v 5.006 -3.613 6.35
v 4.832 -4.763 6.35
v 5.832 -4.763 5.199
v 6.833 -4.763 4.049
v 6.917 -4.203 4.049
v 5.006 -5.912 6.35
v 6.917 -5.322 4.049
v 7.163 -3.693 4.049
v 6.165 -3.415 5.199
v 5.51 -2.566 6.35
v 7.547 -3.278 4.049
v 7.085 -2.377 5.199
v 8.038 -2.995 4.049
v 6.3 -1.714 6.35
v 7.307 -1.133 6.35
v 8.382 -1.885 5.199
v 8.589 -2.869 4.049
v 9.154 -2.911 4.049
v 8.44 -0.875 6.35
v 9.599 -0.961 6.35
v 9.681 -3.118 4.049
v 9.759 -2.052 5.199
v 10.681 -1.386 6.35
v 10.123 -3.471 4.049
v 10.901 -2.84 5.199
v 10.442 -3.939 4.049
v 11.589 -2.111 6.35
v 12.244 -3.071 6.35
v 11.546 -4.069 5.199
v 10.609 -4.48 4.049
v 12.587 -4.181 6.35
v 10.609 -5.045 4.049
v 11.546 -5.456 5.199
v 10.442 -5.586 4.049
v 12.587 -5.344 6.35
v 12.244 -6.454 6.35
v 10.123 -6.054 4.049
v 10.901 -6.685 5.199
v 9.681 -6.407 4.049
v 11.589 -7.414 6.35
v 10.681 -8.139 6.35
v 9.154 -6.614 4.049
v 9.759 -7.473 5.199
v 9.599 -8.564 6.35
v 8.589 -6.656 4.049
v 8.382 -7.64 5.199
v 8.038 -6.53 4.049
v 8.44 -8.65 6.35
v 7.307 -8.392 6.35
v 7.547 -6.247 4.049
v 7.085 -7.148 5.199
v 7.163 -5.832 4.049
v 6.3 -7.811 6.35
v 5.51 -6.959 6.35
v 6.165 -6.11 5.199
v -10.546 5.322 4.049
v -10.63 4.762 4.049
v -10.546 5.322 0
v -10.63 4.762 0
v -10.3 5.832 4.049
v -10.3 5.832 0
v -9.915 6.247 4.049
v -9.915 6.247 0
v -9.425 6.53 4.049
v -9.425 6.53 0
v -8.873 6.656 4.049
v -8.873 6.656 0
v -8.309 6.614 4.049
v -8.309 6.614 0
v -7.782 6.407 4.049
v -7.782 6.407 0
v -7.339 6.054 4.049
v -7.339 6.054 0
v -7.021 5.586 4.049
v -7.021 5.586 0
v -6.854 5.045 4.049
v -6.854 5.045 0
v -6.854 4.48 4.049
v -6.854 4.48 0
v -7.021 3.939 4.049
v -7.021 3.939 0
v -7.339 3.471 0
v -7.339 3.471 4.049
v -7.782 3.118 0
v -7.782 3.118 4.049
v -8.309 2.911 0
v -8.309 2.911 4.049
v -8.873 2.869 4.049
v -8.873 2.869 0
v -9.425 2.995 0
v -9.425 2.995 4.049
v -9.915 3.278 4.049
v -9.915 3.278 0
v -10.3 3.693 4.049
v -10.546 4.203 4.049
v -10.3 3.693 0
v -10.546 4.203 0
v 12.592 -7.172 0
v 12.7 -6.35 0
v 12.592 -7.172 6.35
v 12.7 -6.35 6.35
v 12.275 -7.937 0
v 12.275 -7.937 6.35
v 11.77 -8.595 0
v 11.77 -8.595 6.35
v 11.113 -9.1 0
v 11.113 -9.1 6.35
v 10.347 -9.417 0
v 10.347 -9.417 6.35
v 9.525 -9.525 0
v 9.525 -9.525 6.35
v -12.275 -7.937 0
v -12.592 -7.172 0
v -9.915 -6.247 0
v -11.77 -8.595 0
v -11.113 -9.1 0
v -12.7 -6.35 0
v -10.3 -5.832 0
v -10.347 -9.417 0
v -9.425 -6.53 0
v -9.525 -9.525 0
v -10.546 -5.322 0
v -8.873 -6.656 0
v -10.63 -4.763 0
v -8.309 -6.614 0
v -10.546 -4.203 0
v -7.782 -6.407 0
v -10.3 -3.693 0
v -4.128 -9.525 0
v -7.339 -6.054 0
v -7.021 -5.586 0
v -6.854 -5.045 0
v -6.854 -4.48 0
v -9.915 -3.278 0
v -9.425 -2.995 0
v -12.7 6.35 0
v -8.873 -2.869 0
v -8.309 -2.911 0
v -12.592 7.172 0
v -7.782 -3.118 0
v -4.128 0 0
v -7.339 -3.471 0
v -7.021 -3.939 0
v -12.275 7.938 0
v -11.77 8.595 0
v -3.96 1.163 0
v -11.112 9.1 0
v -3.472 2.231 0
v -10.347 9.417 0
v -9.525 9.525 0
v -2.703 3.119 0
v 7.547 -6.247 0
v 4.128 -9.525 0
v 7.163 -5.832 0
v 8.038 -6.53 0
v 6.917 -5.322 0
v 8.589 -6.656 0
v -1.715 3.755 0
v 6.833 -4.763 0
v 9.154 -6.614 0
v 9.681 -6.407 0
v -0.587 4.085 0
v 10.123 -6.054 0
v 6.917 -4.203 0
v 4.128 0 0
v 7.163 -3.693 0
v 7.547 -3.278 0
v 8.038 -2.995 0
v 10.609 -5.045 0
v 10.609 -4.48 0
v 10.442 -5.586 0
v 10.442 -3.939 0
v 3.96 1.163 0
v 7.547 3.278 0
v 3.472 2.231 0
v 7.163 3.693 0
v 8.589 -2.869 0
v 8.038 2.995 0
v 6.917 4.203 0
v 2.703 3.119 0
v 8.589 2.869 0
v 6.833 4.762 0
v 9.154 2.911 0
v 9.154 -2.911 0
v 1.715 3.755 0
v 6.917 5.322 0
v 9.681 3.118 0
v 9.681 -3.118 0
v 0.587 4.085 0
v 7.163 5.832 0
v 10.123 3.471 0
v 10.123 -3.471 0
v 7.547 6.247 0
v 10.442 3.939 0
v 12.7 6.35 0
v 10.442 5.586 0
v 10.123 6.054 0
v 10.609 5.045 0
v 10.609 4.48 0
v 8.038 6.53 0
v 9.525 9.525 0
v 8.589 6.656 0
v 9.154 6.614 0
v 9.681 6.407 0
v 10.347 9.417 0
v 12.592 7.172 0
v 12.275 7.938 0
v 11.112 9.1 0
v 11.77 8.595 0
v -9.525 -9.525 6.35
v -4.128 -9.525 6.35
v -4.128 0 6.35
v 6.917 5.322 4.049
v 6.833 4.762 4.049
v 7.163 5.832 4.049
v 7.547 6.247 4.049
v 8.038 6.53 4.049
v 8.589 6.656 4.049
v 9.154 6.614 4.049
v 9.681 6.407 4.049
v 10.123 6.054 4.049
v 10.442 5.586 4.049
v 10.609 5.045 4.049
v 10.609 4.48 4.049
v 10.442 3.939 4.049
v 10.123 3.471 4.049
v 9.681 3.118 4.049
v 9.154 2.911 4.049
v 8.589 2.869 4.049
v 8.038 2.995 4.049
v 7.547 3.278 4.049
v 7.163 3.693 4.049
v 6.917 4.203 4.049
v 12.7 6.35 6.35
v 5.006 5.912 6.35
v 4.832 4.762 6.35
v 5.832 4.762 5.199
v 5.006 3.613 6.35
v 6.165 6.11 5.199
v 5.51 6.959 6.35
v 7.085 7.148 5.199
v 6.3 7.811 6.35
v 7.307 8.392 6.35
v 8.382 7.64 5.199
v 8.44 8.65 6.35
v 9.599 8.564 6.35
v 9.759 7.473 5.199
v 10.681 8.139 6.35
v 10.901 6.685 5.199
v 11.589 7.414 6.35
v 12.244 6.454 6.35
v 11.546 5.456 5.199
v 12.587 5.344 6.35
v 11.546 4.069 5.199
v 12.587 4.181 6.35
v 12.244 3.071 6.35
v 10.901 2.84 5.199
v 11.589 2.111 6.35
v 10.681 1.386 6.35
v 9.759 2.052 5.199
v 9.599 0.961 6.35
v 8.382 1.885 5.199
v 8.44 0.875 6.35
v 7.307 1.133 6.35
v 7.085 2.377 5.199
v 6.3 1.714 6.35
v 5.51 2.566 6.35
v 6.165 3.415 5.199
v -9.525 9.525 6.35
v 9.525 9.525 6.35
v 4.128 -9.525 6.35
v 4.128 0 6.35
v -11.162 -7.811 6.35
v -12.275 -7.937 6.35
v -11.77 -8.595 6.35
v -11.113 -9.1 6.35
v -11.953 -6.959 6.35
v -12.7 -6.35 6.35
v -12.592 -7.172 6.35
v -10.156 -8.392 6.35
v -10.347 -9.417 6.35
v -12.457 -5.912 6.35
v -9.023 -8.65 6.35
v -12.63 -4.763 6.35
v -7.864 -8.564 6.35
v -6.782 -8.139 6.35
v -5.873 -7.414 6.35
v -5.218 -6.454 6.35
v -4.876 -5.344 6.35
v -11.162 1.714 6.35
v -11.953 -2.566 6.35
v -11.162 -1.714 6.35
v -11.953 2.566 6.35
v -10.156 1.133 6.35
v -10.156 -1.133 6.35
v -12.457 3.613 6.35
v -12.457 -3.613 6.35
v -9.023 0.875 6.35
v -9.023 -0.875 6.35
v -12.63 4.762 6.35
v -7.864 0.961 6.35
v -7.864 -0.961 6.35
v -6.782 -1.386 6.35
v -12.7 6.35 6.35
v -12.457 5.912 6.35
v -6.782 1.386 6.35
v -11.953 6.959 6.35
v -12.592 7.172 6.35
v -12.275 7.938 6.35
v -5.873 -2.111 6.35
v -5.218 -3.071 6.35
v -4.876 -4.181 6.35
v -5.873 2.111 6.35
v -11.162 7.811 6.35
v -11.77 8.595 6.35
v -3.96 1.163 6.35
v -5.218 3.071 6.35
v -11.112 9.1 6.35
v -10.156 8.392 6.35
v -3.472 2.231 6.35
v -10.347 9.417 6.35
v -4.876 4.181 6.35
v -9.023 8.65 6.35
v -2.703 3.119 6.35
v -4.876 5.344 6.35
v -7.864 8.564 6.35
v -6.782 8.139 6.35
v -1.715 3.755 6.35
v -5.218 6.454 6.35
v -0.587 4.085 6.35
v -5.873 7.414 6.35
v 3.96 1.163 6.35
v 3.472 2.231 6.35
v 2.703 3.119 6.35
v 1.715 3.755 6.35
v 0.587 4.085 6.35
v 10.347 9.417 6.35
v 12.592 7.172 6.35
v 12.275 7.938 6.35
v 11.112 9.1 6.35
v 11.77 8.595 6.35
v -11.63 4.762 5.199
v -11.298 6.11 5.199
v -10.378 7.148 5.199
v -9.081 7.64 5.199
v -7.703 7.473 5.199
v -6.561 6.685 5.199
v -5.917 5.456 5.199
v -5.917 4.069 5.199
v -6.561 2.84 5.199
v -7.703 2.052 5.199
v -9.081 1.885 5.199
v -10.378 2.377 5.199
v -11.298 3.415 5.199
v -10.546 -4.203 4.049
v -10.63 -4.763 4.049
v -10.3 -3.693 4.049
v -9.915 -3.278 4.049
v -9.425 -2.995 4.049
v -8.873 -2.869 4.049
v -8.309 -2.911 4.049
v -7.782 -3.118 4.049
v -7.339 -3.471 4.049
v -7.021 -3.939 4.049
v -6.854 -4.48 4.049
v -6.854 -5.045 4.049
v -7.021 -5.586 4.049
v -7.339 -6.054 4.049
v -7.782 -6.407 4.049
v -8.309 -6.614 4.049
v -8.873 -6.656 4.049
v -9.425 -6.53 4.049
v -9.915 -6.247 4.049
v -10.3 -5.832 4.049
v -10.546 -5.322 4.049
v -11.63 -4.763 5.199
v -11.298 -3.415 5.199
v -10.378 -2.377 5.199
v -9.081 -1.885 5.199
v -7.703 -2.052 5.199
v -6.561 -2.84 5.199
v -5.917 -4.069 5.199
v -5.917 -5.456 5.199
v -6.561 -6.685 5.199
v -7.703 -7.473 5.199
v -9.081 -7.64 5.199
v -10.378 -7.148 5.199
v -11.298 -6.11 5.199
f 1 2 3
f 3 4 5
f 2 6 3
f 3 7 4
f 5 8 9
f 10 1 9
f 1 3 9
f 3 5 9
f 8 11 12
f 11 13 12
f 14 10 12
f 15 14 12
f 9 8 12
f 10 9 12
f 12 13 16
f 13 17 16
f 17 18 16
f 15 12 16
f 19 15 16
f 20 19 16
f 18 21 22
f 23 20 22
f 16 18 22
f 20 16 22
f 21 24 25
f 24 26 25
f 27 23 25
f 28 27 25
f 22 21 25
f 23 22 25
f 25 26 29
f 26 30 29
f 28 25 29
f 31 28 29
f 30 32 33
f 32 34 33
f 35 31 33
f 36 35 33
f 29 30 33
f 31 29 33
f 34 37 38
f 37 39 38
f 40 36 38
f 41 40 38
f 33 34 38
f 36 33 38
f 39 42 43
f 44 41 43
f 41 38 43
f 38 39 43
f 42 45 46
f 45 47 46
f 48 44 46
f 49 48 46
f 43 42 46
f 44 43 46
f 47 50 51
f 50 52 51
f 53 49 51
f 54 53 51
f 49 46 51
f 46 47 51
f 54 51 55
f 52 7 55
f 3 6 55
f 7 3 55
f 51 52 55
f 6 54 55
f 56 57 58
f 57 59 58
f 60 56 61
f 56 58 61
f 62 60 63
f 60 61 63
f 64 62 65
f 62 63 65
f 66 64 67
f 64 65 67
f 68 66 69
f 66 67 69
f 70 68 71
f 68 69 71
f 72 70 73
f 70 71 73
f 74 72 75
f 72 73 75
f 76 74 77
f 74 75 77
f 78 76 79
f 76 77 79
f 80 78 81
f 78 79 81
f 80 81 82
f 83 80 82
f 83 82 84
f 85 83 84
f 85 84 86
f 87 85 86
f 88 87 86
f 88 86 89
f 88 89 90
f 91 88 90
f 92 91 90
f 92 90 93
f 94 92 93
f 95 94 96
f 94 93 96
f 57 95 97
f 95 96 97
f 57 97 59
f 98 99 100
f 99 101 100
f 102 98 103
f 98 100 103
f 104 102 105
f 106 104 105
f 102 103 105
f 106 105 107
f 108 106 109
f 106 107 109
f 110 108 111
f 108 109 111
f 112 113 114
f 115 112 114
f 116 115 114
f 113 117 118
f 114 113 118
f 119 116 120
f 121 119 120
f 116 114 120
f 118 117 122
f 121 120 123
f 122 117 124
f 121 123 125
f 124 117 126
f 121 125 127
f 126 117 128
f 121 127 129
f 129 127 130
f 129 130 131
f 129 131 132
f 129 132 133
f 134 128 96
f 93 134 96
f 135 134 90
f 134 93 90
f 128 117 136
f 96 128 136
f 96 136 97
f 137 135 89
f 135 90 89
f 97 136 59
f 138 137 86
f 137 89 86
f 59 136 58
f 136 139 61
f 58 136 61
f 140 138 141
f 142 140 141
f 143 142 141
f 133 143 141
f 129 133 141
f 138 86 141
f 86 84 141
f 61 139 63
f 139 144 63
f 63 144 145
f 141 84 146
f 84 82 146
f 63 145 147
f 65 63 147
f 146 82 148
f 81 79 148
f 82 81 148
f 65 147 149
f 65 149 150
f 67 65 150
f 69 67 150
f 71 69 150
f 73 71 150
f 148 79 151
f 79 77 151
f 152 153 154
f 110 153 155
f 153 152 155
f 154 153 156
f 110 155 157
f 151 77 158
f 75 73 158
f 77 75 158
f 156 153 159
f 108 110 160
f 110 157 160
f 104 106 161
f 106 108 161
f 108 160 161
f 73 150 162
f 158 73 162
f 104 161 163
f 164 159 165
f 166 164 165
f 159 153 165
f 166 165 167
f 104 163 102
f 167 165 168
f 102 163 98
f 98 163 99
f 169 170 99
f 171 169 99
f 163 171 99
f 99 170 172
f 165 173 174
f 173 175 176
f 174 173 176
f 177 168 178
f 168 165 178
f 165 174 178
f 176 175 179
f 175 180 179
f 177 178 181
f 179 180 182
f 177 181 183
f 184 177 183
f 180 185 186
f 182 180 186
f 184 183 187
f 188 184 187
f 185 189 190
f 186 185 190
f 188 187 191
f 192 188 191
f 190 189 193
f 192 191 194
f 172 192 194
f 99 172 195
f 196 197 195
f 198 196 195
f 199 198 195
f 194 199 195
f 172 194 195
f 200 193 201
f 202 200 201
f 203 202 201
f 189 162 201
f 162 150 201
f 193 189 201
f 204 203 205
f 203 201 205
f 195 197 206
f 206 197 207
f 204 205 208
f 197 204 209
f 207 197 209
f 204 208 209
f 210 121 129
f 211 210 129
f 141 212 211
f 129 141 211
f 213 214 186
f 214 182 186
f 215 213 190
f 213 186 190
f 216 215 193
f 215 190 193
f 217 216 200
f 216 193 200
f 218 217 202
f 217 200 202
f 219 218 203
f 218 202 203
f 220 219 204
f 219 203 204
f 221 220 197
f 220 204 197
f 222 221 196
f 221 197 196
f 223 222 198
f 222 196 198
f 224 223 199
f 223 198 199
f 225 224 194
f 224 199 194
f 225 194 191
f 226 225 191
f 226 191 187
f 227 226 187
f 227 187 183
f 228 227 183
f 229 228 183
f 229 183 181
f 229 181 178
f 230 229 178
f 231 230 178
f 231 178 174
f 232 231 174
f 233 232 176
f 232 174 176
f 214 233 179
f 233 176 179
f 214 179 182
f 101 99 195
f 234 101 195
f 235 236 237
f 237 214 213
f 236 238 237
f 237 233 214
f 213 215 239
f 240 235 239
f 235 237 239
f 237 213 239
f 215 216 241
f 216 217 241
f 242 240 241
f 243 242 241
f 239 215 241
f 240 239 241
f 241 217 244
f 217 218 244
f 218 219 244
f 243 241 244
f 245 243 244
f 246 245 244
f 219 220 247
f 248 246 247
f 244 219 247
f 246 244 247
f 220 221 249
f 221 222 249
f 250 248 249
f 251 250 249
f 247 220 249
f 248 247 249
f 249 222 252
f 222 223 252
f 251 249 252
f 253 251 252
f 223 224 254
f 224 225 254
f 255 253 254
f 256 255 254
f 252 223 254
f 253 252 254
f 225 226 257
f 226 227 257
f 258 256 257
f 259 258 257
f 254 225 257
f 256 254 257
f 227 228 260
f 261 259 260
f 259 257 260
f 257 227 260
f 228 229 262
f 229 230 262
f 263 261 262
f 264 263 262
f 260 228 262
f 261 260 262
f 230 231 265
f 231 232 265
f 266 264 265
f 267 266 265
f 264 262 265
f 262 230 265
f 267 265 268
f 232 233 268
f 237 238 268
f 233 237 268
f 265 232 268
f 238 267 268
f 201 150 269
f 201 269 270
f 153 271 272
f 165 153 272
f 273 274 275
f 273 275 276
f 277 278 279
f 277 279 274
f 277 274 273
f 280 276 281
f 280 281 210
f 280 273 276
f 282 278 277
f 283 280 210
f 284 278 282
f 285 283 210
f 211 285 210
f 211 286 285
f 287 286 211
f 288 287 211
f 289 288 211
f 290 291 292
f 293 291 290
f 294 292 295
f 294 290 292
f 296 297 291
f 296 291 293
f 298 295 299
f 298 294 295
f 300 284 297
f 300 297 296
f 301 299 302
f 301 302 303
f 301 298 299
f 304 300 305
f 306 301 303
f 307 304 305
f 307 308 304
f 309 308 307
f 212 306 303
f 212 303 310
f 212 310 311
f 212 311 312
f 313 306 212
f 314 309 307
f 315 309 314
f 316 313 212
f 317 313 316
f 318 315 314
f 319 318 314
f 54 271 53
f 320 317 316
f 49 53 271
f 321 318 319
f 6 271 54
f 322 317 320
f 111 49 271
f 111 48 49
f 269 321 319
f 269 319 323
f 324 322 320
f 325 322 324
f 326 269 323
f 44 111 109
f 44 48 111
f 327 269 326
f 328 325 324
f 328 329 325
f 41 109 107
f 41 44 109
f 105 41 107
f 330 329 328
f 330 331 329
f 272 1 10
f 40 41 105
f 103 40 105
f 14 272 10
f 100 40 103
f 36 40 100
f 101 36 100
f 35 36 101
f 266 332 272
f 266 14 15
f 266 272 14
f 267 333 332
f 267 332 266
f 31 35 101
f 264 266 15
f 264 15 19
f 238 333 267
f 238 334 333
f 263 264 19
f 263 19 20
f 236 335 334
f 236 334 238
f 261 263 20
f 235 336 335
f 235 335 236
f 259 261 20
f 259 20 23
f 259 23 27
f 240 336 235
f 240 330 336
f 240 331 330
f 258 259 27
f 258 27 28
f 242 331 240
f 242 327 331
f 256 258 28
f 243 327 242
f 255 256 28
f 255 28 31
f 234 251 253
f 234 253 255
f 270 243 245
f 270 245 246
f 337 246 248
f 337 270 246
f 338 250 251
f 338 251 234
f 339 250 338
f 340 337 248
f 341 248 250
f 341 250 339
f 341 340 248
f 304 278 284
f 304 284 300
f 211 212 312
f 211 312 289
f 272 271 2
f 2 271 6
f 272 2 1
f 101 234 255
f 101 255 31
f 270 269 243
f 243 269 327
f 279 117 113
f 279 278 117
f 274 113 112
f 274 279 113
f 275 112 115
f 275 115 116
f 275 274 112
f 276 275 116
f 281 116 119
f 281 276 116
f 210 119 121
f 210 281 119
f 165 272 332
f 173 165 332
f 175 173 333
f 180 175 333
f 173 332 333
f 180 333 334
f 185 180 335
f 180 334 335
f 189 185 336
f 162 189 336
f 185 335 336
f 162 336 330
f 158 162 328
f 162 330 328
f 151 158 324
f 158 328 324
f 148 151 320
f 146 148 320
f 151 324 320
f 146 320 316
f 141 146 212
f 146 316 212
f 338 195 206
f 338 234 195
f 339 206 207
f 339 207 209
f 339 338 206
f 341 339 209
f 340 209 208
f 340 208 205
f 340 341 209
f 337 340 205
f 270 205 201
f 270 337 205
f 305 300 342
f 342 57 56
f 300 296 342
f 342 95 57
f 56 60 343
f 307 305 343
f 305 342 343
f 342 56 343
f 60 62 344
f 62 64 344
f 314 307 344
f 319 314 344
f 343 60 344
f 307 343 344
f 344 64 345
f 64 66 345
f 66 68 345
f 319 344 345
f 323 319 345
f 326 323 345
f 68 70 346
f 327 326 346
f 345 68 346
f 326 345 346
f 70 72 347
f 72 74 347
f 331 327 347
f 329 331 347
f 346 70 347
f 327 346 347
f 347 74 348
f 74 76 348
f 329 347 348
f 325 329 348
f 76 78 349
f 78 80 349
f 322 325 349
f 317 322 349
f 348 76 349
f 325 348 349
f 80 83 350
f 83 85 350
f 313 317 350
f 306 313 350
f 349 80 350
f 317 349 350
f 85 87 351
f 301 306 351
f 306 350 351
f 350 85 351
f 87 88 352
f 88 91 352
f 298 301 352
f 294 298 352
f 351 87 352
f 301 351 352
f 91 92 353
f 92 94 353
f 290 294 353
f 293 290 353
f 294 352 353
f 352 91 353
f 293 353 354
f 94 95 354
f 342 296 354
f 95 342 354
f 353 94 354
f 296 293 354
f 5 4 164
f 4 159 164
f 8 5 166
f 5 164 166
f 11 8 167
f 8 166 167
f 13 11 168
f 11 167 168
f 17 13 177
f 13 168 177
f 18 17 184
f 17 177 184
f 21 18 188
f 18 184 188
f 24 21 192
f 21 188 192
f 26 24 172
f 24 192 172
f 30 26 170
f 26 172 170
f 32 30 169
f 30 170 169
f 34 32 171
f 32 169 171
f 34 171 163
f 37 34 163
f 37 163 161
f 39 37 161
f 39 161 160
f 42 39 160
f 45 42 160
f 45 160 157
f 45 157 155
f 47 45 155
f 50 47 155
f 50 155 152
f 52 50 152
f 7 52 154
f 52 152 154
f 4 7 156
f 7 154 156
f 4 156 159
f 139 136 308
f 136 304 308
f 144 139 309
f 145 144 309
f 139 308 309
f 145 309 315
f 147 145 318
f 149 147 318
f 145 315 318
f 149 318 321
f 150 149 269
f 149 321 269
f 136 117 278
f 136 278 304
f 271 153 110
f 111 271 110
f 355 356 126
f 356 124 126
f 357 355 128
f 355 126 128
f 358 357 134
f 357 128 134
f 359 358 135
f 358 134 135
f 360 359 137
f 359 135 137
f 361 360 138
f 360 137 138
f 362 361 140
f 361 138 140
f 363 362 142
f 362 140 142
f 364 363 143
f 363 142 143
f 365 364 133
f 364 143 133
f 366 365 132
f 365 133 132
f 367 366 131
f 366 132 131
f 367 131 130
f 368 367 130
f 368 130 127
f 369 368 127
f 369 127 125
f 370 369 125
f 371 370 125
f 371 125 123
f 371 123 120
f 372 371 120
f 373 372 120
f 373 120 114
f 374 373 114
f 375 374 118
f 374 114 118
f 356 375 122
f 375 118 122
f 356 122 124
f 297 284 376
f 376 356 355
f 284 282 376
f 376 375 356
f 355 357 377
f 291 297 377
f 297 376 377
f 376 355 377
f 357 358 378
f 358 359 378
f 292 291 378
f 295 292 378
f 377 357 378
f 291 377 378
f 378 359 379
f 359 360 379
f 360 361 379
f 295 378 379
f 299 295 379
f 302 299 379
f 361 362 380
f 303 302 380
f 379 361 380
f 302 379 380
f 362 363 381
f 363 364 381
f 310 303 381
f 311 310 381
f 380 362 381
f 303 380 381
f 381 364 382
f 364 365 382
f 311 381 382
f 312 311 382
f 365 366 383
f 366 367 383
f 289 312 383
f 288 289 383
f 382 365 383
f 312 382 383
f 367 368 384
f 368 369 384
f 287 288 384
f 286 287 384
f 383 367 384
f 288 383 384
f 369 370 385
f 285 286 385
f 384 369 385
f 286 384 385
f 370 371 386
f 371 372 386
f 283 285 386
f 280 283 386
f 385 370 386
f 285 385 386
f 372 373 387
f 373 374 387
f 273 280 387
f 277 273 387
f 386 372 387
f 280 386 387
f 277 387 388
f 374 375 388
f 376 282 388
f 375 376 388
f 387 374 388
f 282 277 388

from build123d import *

# Parameters (mm, degrees)
F0_W           = 25.4
F0_H           = 19.05
F1_DEPTH       = 6.35
F3_DEPTH       = 6.351
F5_D           = 3.7973
F5_CSINK_D     = 7.7978
F5_CSINK_ANGLE = 82
F6_R           = 3.175


with BuildPart() as f1:
    # F0 (on Top) → F1 (new body)
    with BuildSketch(Plane.XY):
        Rectangle(F0_W, F0_H)
    extrude(amount=F1_DEPTH)

    # F2 (on face) → F3 (cut, through all)
    with BuildSketch(Plane.XY.offset(6.35)):
        with BuildLine():
            Line((4.1275, -9.525), (4.1275, 0))
            ThreePointArc((4.1275, 0), (0, 4.1275), (-4.1275, 0))
            Line((-4.1275, 0), (-4.1275, -9.525))
            Line((-4.1275, -9.525), (4.1275, -9.525))
        make_face()
    extrude(amount=-F3_DEPTH, mode=Mode.SUBTRACT)

    # F5 (through all)
    with Locations(Plane.XY.offset(6.35)):
        with Locations((-8.73125, 4.7625), (8.73125, 4.7625), (8.73125, -4.7625), (-8.73125, -4.7625)):
            CounterSinkHole(F5_D / 2, F5_CSINK_D / 2, counter_sink_angle=F5_CSINK_ANGLE)

    # F6
    f6_edges = [f1.edges().sort_by_distance(p)[0] for p in [
        (-12.7, 9.525, 3.175),
        (-12.7, -9.525, 3.175),
        (12.7, -9.525, 3.175),
        (12.7, 9.525, 3.175),
    ]]
    fillet(f6_edges, radius=F6_R)


solid = f1.part
